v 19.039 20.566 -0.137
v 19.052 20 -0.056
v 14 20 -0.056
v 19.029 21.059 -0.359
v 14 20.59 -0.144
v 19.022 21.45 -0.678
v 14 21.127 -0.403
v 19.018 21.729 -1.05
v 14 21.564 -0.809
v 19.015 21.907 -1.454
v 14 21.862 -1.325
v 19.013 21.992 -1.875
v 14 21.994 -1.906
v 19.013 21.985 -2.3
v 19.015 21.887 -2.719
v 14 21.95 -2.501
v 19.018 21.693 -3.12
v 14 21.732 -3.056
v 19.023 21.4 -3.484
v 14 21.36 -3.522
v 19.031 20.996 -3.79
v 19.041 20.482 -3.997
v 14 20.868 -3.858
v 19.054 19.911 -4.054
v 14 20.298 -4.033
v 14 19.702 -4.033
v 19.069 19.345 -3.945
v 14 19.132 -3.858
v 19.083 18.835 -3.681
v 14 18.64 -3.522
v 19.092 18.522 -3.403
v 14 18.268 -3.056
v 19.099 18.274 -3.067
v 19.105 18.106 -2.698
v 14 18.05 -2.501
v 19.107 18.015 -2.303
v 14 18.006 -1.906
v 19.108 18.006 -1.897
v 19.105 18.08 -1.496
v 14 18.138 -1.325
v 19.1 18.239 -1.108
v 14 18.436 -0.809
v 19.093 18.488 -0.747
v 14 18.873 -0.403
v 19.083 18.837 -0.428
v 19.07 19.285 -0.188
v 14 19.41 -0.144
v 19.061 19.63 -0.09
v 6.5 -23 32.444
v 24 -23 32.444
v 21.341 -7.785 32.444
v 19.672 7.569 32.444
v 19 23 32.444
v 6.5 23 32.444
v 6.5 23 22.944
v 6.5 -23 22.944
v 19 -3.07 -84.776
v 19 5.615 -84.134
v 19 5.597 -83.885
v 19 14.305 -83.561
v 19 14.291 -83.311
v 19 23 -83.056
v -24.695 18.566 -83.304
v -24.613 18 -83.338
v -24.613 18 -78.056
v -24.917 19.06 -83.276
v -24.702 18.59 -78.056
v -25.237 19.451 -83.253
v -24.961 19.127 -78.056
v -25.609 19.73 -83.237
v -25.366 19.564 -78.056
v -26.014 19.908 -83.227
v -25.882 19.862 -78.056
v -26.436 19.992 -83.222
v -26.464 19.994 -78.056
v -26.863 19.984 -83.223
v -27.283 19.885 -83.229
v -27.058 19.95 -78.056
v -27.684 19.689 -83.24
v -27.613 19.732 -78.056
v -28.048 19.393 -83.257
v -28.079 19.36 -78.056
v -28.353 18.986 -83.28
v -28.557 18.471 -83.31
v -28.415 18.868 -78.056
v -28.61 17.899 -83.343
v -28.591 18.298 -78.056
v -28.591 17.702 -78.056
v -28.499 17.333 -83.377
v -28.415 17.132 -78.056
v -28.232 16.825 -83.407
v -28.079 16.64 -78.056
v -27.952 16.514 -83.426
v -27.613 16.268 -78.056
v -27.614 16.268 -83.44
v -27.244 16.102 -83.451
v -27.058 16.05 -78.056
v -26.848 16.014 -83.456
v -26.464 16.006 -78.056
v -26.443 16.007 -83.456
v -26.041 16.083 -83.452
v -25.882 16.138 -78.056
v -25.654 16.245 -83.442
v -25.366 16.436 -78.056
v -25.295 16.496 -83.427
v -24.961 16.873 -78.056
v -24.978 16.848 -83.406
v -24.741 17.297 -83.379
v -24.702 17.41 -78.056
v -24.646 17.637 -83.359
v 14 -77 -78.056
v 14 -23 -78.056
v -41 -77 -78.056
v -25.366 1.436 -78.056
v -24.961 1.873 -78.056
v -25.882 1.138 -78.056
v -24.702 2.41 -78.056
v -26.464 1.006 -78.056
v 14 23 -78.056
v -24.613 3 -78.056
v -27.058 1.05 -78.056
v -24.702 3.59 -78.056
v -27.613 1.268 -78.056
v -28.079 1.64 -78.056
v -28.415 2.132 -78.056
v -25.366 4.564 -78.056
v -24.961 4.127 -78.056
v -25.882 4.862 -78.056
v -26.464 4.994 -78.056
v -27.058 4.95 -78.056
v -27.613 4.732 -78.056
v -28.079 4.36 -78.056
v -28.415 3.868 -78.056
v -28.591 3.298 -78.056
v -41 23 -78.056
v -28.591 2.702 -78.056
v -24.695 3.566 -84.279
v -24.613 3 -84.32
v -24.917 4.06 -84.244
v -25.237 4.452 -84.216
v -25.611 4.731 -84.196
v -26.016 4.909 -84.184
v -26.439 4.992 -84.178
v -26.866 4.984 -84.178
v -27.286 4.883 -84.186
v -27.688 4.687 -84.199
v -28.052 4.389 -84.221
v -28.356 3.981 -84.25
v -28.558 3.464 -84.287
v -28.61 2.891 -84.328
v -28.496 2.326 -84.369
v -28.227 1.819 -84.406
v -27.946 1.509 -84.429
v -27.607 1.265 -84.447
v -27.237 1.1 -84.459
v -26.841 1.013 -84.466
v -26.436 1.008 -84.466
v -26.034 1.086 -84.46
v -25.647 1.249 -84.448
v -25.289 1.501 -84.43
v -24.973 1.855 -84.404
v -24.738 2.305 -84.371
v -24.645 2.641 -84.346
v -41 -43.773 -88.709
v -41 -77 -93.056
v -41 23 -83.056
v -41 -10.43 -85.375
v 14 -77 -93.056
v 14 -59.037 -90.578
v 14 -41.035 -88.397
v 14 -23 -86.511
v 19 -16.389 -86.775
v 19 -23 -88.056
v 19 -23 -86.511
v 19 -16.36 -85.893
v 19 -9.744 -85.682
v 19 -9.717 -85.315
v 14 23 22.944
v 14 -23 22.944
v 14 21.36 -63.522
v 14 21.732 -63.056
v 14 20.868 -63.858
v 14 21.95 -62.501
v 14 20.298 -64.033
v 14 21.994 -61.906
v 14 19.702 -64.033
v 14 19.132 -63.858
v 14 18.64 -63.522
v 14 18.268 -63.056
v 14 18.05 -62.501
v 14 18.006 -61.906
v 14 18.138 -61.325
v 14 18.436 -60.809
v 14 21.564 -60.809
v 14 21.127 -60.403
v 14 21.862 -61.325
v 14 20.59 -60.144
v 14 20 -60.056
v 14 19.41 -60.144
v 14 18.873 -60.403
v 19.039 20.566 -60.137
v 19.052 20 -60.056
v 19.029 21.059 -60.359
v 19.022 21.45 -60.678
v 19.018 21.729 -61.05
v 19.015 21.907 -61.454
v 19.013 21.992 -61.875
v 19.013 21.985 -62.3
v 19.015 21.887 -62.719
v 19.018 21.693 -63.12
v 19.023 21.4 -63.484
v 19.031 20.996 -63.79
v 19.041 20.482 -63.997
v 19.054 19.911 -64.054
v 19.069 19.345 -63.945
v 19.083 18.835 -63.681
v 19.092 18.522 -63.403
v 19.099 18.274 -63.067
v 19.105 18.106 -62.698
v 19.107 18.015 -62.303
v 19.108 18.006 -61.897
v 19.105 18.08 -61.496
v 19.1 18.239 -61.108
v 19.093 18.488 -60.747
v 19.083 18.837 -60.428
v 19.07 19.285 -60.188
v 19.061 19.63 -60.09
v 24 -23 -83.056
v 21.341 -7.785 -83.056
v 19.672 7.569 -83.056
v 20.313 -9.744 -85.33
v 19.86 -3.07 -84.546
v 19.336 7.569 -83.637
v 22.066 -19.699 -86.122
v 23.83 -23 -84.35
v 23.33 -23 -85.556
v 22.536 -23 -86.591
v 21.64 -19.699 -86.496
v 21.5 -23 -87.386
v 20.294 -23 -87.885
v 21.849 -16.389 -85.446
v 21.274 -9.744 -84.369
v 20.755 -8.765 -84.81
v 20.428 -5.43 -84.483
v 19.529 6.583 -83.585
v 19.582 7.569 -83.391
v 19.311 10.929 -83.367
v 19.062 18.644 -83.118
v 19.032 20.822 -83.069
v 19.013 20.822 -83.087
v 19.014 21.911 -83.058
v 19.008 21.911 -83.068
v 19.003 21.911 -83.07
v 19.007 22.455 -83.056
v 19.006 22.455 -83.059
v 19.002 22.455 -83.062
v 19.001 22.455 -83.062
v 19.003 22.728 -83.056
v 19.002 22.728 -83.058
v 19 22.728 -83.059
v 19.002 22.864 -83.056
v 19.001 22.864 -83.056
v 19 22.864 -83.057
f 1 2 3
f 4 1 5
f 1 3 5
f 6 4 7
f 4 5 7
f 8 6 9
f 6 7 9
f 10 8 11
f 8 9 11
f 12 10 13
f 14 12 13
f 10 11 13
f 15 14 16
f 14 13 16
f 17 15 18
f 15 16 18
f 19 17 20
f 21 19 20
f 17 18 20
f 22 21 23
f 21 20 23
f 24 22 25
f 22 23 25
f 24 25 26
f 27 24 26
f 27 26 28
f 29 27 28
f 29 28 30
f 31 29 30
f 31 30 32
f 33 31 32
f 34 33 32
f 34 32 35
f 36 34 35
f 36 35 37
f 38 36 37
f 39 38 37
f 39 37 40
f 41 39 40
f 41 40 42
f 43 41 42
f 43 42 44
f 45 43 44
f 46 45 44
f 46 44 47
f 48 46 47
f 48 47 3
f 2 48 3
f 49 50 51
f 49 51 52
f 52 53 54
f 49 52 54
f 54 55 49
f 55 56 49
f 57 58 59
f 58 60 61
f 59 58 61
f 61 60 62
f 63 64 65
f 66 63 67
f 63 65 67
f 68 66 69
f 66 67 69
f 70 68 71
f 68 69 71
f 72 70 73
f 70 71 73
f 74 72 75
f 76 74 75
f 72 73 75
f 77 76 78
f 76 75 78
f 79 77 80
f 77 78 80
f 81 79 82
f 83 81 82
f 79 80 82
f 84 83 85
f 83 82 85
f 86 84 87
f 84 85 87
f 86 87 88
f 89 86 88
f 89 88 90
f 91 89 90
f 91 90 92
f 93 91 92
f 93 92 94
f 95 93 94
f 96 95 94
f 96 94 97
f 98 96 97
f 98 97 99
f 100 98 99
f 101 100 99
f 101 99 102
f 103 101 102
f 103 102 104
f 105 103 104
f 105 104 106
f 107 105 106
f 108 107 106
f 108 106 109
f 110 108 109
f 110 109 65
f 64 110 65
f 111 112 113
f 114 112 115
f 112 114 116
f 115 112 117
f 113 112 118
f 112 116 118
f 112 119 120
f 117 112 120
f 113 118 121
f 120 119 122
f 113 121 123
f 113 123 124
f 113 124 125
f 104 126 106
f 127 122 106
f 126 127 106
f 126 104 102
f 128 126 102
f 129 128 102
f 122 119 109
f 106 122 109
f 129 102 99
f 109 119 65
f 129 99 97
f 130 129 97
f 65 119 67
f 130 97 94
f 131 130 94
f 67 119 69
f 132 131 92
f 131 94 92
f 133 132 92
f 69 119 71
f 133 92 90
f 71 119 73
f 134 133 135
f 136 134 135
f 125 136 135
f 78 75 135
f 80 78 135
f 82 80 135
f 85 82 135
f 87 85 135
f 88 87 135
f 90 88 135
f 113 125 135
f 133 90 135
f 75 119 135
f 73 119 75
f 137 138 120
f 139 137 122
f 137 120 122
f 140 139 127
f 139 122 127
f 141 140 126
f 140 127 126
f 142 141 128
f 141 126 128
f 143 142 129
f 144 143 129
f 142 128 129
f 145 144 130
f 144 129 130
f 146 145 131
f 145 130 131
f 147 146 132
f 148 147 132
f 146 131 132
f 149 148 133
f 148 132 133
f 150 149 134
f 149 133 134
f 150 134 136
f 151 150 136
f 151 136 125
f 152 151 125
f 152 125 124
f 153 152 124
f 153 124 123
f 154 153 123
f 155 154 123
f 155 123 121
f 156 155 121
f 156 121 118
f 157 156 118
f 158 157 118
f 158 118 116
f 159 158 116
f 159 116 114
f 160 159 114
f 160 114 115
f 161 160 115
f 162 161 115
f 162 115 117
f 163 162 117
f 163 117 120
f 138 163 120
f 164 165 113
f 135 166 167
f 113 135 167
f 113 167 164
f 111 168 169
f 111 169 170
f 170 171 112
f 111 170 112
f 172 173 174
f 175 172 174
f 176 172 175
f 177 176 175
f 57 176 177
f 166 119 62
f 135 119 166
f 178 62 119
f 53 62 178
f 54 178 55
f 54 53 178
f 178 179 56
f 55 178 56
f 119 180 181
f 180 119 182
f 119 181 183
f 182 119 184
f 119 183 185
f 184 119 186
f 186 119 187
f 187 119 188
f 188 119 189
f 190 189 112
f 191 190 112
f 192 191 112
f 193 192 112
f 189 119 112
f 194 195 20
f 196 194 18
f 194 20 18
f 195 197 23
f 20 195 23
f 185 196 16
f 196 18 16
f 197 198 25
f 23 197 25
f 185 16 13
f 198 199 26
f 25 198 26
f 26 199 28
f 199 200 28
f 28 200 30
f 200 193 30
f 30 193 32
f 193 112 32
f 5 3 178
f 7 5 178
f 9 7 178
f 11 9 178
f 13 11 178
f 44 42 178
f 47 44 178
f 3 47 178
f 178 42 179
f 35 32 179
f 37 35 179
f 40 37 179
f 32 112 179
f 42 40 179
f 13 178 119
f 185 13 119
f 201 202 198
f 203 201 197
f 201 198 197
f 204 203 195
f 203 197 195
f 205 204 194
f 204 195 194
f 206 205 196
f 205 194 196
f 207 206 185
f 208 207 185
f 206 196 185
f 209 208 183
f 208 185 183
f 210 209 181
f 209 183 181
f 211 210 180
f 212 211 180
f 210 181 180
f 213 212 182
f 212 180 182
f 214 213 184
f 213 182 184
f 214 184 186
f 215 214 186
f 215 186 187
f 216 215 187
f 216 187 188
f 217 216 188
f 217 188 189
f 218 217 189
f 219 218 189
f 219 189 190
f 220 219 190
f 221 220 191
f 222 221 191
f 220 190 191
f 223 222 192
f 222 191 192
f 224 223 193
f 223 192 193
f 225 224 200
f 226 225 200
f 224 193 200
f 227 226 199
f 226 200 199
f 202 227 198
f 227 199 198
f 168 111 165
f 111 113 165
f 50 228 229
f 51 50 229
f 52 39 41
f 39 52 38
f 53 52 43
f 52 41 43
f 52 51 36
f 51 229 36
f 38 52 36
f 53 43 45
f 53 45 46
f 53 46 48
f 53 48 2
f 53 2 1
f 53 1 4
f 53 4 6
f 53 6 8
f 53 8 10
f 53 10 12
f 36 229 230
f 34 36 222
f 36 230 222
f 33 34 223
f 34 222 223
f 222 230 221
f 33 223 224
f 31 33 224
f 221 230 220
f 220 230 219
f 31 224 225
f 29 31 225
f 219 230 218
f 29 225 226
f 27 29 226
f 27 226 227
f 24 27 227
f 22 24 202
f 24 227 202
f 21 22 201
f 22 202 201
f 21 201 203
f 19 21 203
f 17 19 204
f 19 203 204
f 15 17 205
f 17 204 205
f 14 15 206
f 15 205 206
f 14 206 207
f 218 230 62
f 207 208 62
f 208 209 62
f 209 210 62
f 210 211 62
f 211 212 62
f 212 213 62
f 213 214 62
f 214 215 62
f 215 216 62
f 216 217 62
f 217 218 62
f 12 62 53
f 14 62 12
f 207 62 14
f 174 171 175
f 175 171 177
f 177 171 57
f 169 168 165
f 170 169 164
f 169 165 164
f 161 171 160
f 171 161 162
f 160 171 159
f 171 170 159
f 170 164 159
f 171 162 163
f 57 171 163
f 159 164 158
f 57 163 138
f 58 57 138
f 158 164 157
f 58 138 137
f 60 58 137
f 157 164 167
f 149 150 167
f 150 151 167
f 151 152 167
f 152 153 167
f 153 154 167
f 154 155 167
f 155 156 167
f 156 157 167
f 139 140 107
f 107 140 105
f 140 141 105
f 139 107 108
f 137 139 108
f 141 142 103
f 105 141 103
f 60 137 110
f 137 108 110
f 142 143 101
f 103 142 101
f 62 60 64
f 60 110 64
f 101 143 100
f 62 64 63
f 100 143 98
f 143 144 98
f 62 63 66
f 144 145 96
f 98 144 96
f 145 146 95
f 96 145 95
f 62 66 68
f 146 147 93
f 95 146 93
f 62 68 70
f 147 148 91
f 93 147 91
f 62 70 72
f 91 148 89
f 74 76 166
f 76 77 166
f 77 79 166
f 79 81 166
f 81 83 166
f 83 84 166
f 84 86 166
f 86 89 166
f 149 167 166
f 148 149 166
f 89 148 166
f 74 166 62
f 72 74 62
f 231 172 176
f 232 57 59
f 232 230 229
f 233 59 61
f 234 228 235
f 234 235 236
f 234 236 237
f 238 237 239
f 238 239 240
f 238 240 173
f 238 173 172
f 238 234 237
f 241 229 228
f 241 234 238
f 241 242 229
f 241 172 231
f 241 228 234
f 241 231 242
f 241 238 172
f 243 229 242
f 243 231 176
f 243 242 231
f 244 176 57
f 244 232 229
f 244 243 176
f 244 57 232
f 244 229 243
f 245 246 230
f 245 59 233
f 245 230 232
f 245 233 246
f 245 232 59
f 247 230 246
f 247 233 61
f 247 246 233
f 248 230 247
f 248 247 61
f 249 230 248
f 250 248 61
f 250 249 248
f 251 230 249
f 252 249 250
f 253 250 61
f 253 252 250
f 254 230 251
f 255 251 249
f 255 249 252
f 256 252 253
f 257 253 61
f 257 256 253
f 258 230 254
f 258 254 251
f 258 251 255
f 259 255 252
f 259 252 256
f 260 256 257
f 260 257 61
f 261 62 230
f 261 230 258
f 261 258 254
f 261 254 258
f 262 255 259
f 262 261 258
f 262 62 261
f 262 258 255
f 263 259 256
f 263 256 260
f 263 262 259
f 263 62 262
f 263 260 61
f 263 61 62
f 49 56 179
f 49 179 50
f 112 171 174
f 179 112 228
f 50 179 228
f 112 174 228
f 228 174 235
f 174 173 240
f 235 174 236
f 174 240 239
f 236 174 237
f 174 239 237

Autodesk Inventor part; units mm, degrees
ref_plane "Back of Base Plane" through (0, 0, -70.0556) normal (0, 0, 1) x (1, 0, 0)
ref_plane "Side of Base Plane" through (6.5, 0, 0) normal (1, 0, 0) x (0, 1, 0)
ref_plane "Side Bolt Offset Plane" through (16.2, 0, 0) normal (1, 0, 0) x (0, 1, 0)
ref_plane "Back Bolt Offset Plane" through (0, 0, -78.0556) normal (0, 0, 1) x (1, 0, 0)
sketch "Interface - EDIT TO CHANGE SHAPE" plane through (0, 0, 0) normal (0, 1, 0) x (-1, 0, 0)
  line L0 (0, 0) -> (-14, 0) construction
  line L1 (-14, 0) -> (-14, -74.0556) construction
  line L2 (-31, -70.0556) -> (53, -70.0556) construction
  line L3 (-19, -83.0556) -> (41, -83.0556)
  line L4 (0, -106.1556) -> (0, 55.5444) construction
  line L5 (-6.5, -106.1556) -> (-6.5, 55.5444) construction
  line L6 (-14, -76.0556) -> (-14, 22.9444)
  line L7 (-14, 22.9444) -> (-6.5, 22.9444)
  line L8 (-6.5, 22.9444) -> (-6.5, 32.4444)
  line L9 (-6.5, 32.4444) -> (-19, 32.4444)
  line L10 (-19, 32.4444) -> (-19, -83.0556)
  line L11 (-12, -78.0556) -> (41, -78.0556)
  line L12 (41, -78.0556) -> (41, -83.0556)
  line L13 (-14, -76.0556) -> (-14, -78.0556)
  line L14 (-14, -78.0556) -> (-12, -78.0556)
  point P0 (27.5, -70.0556)
  dimension "d11" = 14
  dimension "d65" = 101
  dimension "d66" = 7.5
  dimension "d67" = 9.5
  dimension "d68" = 60
  dimension "d69" = 5
extrude "Interface - EDIT TO CHANGE HEIGHT" add sketch "Interface - EDIT TO CHANGE SHAPE" along normal mid plane 46
sketch "Sketch18" plane through (0, -23, 0) normal (0, -1, 0) x (1, 0, 0)
  line L0 (14, -78.0556) -> (14, 22.9444) projected
  line L1 (14, -78.0556) -> (-41, -78.0556)
  line L2 (-41, -78.0556) -> (-41, -83.0556)
  line L3 (-41, -83.0556) -> (14, -83.0556)
  line L4 (14, -83.0556) -> (14, -78.0556)
  point P0 (0, 0)
extrude "Extrusion15" add sketch "Sketch18" along normal blind 54
sketch "Sketch19" plane through (19, 23, -83.0556) normal (0, 0, -1) x (-1, 0, 0)
  line L0 (0, -46) -> (0, 0) projected
  line L1 (0, -46) -> (-5, -46)
  arc A0 (-5, -46) -> (0, 0) centre (-238.4597, 2.6478) ccw
  point P0 (19, -23)
  dimension "d76" = 5
extrude "Extrusion16" add sketch "Sketch19" against normal blind 115.5
sketch "Sketch20" plane through (-41, 23, -83.0556) normal (-1, 0, 0) x (0, 0, 1)
  line L0 (0, -100) -> (0, 0) projected
  line L1 (0, -100) -> (-10, -100)
  arc A0 (-10, -100) -> (0, 0) centre (-1100.4358, 59.5436) ccw
  point P0 (83.0556, -23)
  dimension "d79" = 10
extrude "Extrusion17" add sketch "Sketch20" against normal blind 60
sketch "Sketch21" plane through (14, -23, -83.0556) normal (0, 0, 1) x (1, 0, 0)
  line L0 (0, 0) -> (5, 0) projected
  line L1 (0, 0) -> (0, -54) projected
  line L2 (5, 0) -> (0, 0)
  line L3 (0, 0) -> (0, -54)
  line L4 (0, -54) -> (5, -54)
  line L5 (5, -54) -> (5, 0)
  point P0 (-14, 23)
extrude "Extrusion18" cut sketch "Sketch21" against normal blind 10
sketch "Sketch22" plane through (24, -23, -83.0556) normal (0, 0, -1) x (-1, 0, 0)
  line L0 (5, 0) -> (5, 46) projected
  arc A0 (0, 0) -> (5, 46) centre (-233.4597, 48.6478) ccw projected
  line L1 (5, 0) -> (0, 0) projected
  point P0 (24, 23)
revolve "Revolution3" add sketch "Sketch22" angle 90 about axis through (19, -23, -83.0556) along (0, 1, 0)
sketch "Sketch23" plane through (-41, 23, -78.0556) normal (0, 0, 1) x (1, 0, 0)
  circle A0 centre (14.387, -5) radius 2
  circle A1 centre (14.387, -20) radius 2
  line L0 (55, 0) -> (55, -46) projected
  line L1 (0, 0) -> (55, 0) projected
  point P0 (41, -23)
  dimension "d85" = 4
  dimension "d86" = 4
  dimension "d87" = 40.613
  dimension "d88" = 40.613
  dimension "d89" = 5
  dimension "d93" = 15
extrude "Extrusion19" cut sketch "Sketch23" against normal blind 10
sketch "Sketch24" plane through (14, -23, 22.9444) normal (-1, 0, 0) x (0, 0, 1)
  circle A0 centre (-85, 43) radius 2
  circle A1 centre (-25, 43) radius 2
  line L0 (-101, 46) -> (0, 46) projected
  line L1 (-101, 0) -> (-101, 46) projected
  point P0 (-22.9444, 23)
  dimension "d94" = 4
  dimension "d95" = 4
  dimension "d96" = 60
  dimension "d97" = 3
  dimension "d98" = 3
  dimension "d99" = 16
extrude "Extrusion20" cut sketch "Sketch24" against normal blind 10
equation "\"d88\" = d87"
equation "\"d95\" = d94"
properties part number "Base Side Armor - Left"
